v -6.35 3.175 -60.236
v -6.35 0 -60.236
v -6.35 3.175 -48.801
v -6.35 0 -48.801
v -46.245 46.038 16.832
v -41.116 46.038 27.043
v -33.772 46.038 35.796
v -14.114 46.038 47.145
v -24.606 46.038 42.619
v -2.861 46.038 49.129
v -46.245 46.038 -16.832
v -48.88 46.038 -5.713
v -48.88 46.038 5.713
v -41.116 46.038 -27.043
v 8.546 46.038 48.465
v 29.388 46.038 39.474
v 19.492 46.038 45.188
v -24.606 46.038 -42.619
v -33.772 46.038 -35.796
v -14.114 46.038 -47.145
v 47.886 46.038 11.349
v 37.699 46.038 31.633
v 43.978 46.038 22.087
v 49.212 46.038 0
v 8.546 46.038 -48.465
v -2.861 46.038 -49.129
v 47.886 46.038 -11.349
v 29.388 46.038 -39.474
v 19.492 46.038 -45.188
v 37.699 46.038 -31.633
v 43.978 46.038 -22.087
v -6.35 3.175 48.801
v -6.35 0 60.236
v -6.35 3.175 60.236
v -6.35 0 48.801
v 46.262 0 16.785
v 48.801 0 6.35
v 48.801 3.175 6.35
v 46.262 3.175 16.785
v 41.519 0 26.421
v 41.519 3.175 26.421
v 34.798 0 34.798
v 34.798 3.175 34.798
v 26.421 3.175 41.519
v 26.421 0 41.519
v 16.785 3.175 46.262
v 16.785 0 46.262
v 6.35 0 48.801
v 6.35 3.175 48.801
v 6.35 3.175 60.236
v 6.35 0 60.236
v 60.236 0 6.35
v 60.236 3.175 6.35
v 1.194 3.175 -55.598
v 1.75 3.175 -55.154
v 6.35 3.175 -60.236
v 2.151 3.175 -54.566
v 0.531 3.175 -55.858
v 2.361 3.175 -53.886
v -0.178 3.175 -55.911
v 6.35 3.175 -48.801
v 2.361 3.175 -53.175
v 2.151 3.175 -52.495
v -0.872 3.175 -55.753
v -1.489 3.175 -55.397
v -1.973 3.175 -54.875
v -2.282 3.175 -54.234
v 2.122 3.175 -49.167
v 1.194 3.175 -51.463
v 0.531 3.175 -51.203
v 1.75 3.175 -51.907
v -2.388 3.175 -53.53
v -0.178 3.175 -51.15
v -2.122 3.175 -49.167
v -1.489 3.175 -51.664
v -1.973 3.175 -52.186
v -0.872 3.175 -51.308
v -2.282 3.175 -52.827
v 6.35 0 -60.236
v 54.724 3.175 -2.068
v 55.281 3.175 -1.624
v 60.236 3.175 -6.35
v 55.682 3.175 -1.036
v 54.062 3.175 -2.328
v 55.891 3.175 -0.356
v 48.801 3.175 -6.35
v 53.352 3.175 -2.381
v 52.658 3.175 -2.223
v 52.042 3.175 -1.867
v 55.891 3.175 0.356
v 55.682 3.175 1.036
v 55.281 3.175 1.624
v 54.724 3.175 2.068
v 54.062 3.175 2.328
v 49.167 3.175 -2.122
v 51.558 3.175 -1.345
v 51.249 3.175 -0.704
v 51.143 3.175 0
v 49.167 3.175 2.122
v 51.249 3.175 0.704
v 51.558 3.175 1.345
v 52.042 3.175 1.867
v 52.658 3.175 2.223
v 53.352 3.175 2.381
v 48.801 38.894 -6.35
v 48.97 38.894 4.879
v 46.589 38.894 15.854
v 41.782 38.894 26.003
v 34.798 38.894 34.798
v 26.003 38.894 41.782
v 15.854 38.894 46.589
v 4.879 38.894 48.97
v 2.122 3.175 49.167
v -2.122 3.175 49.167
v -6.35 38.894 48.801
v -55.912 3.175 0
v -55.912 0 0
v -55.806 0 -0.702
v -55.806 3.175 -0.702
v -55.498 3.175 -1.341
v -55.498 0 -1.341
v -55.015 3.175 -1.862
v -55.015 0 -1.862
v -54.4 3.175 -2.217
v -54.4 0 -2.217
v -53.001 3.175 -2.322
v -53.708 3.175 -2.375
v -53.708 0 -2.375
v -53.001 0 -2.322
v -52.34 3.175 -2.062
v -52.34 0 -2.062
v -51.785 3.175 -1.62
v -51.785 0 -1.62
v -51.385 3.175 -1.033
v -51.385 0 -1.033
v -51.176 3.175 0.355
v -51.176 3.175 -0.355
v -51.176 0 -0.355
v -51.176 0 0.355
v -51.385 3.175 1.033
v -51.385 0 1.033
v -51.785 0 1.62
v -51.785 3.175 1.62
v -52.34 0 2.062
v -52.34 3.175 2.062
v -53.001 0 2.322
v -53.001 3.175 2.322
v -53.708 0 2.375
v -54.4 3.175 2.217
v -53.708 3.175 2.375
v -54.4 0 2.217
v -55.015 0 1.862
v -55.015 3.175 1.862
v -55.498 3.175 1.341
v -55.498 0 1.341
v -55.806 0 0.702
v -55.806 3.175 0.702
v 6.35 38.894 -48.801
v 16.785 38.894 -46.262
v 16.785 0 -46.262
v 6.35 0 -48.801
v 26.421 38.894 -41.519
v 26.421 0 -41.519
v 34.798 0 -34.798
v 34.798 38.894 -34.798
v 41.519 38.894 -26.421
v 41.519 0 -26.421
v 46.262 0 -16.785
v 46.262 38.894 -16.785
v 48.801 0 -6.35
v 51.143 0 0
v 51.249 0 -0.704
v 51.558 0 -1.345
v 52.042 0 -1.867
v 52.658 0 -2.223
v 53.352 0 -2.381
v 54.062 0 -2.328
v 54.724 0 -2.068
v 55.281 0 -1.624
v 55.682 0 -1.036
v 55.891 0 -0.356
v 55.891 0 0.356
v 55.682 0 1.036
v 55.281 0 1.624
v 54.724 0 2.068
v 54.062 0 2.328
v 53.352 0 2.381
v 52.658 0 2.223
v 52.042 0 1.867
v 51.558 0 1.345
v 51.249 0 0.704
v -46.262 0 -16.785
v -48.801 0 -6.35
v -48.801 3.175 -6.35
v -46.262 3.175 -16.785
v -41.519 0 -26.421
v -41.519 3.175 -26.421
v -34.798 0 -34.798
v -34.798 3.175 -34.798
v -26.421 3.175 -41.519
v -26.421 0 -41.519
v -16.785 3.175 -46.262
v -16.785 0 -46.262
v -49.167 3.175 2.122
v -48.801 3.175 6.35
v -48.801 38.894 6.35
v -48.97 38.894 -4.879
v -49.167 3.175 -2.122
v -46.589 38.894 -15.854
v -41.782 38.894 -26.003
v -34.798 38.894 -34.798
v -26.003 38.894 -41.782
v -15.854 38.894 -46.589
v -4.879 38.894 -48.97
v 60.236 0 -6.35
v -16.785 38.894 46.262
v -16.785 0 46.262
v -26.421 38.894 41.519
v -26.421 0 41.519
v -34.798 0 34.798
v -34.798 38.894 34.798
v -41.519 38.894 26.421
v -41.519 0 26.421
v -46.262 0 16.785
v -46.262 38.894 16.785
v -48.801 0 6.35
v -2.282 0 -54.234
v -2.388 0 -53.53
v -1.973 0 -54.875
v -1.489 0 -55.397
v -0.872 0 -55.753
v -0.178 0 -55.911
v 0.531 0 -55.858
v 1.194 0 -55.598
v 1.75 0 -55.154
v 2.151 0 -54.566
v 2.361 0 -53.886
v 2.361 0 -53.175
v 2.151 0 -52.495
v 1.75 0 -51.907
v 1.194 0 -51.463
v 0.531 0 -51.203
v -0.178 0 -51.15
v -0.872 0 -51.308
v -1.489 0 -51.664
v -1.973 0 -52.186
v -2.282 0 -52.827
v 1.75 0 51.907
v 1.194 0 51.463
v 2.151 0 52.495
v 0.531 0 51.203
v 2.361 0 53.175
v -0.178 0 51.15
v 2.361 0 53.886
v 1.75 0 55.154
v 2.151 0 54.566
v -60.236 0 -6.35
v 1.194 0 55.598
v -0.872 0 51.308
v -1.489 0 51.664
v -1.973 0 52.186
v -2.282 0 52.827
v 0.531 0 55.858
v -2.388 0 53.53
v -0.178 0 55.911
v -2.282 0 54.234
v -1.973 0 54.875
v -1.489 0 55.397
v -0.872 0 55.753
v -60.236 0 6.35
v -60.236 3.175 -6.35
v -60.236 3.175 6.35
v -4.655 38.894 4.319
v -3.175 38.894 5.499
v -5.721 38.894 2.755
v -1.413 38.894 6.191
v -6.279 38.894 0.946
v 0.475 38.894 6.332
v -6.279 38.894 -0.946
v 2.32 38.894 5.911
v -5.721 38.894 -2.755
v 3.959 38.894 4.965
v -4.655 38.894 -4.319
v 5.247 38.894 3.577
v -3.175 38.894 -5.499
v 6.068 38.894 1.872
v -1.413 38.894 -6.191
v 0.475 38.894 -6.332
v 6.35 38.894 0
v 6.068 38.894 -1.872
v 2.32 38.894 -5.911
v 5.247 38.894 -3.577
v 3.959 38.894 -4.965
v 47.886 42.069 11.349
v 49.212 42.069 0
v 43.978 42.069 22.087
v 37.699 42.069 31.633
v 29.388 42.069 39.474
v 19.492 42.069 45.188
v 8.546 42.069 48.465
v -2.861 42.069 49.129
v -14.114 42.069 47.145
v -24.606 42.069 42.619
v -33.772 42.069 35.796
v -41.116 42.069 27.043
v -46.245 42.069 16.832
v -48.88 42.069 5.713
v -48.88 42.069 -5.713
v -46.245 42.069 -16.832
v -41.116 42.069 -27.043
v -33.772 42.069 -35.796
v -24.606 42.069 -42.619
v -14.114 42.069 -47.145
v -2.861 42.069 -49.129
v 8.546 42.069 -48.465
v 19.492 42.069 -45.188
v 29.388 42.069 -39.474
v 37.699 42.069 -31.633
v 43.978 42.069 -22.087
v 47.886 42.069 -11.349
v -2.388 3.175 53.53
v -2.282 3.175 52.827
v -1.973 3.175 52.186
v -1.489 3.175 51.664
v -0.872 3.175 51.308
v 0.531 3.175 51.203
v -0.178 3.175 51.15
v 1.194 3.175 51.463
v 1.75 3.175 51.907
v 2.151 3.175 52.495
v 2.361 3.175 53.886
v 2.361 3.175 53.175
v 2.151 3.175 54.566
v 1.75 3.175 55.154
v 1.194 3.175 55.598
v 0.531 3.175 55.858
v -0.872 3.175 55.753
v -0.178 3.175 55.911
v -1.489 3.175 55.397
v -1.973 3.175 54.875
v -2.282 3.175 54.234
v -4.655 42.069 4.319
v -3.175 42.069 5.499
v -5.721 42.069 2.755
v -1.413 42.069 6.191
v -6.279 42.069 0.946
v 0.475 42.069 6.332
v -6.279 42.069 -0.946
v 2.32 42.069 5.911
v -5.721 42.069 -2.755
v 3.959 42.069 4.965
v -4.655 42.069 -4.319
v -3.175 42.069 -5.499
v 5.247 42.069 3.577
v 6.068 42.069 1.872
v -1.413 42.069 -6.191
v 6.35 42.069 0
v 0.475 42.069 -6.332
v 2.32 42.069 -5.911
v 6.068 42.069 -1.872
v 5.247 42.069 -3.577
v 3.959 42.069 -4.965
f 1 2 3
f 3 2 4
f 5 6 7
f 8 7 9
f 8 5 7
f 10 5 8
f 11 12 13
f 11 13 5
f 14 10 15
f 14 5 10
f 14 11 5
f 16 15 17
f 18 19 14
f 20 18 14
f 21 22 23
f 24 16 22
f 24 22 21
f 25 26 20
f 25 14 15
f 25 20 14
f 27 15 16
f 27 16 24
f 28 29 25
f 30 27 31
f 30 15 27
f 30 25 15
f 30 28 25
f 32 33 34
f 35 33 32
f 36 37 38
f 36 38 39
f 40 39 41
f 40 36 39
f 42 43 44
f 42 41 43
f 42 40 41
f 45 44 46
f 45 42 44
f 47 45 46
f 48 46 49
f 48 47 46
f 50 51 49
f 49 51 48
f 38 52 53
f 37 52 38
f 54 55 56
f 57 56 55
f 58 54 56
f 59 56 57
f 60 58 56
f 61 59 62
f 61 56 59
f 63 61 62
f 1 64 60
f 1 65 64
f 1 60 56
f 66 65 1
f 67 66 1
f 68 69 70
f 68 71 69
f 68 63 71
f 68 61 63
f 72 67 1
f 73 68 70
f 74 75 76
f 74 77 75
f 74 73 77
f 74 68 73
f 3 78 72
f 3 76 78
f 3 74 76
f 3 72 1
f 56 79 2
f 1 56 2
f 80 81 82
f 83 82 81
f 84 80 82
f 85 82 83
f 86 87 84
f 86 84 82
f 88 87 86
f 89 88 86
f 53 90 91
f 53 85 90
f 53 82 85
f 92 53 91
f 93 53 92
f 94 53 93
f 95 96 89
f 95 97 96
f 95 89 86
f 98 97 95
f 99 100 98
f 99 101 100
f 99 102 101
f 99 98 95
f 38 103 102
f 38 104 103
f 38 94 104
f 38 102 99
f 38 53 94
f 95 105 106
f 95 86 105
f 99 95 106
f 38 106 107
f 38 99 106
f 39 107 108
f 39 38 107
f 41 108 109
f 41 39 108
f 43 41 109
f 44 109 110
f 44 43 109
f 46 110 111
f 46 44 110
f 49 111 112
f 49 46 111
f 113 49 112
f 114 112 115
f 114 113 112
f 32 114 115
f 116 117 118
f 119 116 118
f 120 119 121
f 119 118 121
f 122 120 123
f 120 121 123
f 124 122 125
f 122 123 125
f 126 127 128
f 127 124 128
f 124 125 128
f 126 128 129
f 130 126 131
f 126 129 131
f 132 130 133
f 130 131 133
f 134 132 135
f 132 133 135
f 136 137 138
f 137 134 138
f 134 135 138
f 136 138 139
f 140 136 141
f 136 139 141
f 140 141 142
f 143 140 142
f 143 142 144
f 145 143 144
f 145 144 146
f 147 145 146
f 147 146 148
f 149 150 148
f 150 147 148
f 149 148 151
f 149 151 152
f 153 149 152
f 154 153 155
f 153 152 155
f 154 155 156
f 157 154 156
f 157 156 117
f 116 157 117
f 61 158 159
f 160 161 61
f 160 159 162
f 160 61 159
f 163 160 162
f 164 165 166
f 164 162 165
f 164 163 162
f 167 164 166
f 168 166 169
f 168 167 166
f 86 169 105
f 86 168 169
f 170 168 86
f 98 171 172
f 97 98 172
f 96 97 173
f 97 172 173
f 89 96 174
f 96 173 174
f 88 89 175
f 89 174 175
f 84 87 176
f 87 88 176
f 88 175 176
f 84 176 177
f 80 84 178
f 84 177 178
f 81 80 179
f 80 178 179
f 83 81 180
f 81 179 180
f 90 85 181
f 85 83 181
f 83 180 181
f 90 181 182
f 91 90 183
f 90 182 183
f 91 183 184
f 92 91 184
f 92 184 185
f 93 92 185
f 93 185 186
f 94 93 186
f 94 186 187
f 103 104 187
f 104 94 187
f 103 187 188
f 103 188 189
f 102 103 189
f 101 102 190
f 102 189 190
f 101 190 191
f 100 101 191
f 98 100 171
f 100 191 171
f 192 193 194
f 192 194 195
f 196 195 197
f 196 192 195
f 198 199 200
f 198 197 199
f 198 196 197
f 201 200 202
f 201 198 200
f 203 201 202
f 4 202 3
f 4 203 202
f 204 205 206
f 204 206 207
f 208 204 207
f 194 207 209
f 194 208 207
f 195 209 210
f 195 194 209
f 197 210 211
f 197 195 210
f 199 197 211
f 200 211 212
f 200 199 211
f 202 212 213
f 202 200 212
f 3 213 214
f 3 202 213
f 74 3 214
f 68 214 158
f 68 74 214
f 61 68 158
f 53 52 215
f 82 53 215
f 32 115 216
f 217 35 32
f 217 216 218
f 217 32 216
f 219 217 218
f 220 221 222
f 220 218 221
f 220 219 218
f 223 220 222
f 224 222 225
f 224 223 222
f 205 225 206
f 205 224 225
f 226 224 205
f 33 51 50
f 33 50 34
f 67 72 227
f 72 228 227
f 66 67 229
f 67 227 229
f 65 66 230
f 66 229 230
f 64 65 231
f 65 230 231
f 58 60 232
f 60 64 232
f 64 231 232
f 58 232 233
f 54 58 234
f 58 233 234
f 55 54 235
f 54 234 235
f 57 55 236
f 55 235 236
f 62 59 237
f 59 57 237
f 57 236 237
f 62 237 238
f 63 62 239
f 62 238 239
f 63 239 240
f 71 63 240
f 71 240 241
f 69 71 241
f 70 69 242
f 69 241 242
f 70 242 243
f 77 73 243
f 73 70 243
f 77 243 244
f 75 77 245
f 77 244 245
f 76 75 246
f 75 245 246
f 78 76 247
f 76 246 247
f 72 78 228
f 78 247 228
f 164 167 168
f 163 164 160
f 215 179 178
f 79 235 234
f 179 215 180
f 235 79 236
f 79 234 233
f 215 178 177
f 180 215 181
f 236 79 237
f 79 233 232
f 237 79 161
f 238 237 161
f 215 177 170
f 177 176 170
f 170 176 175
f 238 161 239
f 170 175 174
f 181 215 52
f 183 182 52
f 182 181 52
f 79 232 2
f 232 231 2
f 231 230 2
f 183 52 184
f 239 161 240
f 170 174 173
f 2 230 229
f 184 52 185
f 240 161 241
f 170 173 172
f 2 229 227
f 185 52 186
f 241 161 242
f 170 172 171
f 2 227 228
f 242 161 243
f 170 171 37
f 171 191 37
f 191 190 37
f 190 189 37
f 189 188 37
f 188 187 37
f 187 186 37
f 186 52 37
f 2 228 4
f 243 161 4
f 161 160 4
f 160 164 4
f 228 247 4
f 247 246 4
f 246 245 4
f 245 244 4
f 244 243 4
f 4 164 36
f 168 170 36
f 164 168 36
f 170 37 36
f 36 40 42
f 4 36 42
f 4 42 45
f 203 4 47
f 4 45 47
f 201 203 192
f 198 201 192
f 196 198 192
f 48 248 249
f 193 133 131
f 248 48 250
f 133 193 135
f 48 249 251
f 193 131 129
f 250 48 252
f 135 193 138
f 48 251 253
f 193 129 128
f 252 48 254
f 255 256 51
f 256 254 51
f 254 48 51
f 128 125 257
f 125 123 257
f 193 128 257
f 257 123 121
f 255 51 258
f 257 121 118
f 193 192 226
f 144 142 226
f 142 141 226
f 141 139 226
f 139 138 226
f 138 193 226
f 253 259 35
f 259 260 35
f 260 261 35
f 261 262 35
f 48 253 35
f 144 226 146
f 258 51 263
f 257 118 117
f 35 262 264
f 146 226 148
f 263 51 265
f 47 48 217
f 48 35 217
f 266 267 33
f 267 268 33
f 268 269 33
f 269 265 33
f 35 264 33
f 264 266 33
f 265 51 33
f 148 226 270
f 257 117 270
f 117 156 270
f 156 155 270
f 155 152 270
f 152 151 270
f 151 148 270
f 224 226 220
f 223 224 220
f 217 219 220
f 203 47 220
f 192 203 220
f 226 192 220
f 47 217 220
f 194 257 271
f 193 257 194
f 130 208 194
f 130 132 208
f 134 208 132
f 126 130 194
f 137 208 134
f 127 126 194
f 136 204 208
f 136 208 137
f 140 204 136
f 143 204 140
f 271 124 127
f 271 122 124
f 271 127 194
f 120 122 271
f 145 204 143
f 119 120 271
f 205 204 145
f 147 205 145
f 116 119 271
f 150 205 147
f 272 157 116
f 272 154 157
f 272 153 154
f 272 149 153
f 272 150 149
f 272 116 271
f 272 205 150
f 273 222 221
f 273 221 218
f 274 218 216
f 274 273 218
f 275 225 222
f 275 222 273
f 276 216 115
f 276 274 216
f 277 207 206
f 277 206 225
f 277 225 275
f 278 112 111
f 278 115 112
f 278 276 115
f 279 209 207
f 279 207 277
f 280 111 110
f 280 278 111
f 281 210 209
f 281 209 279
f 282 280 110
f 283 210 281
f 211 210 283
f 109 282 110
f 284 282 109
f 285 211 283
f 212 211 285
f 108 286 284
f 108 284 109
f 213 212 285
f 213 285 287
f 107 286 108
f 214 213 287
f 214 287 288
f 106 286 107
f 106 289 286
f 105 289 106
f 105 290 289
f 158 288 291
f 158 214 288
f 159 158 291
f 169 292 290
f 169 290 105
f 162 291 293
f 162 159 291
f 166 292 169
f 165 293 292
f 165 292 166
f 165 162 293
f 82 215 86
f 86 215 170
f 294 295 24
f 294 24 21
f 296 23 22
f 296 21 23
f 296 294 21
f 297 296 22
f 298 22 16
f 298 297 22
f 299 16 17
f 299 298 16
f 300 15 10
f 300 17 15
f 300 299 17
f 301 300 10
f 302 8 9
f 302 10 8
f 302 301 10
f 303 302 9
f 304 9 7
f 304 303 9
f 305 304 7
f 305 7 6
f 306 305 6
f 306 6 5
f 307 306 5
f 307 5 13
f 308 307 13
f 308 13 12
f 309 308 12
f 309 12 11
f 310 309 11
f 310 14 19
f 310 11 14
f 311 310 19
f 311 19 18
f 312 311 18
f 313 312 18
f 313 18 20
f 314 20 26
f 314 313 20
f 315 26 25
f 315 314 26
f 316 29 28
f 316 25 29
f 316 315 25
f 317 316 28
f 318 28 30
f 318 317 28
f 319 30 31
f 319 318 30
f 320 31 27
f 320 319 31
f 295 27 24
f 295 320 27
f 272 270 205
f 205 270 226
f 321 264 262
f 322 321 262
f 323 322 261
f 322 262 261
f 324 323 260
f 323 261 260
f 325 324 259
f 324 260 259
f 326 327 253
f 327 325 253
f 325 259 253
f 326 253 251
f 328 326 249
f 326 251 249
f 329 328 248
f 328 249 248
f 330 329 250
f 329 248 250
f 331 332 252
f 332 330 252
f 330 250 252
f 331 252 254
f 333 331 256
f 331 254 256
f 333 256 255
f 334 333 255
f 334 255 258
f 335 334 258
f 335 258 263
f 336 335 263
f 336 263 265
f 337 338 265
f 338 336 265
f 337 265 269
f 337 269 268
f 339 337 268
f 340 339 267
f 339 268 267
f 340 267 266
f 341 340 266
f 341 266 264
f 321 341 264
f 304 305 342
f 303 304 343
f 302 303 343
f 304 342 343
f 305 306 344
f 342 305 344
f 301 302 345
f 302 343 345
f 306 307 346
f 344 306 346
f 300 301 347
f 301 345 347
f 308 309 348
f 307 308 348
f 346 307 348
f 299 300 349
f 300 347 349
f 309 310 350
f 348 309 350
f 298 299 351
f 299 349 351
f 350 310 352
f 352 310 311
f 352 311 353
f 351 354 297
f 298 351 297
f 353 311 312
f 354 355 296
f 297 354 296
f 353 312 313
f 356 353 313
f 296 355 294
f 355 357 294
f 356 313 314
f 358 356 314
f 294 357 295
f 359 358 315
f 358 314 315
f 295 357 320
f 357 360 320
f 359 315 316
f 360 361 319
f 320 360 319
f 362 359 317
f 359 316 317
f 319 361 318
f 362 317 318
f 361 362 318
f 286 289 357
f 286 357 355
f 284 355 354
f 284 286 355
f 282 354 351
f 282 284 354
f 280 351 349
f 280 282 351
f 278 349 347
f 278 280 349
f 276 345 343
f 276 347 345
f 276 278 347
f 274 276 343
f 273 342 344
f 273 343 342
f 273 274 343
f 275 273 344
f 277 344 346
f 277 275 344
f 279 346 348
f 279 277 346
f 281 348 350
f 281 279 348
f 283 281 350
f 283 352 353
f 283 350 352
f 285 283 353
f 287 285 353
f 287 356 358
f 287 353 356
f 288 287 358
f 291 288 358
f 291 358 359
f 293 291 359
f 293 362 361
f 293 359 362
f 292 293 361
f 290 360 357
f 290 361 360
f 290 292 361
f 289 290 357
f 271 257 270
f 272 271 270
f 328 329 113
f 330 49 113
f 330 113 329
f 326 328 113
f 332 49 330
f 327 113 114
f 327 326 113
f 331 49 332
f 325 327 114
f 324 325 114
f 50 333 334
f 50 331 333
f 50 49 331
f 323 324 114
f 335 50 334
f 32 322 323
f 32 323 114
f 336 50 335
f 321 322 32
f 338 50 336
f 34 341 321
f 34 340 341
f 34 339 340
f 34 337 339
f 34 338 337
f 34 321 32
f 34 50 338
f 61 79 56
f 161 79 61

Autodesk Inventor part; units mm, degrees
ref_plane "YZ Plane" through (0, 0, 0) normal (1, 0, 0) x (0, 1, 0)
ref_plane "XZ Plane" through (0, 0, 0) normal (0, 1, 0) x (-1, 0, 0)
ref_plane "XY Plane" through (0, 0, 0) normal (0, 0, 1) x (1, 0, 0)
sketch "Sketch1" plane through (0, 0, 0) normal (0, 1, 0) x (-1, 0, 0)
  circle A0 centre (53.5305, 0) radius 2.3813
  circle A1 centre (0, -53.5305) radius 2.3876
  circle A2 centre (-53.5305, 0) radius 2.3876
  circle A3 centre (0, 53.5305) radius 2.3876
  line L0 (0, 60.2361) -> (-6.35, 60.2361)
  line L1 (-6.35, 60.2361) -> (6.35, 60.2361)
  line L2 (6.35, 60.2361) -> (6.35, 48.8011)
  line L3 (-6.35, 60.2361) -> (-6.35, 48.8011)
  line L4 (-60.2361, 0) -> (-60.2361, -6.35)
  line L5 (-60.2361, -6.35) -> (-60.2361, 6.35)
  line L6 (-60.2361, 6.35) -> (-48.8011, 6.35)
  line L7 (-60.2361, -6.35) -> (-48.8011, -6.35)
  line L8 (0, -60.2361) -> (-6.35, -60.2361)
  line L9 (-6.35, -60.2361) -> (6.35, -60.2361)
  line L10 (6.35, -60.2361) -> (6.35, -48.8011)
  line L11 (-6.35, -60.2361) -> (-6.35, -48.8011)
  line L12 (60.2361, 0) -> (60.2361, -6.35)
  line L13 (60.2361, -6.35) -> (60.2361, 6.35)
  line L14 (60.2361, 6.35) -> (48.8011, 6.35)
  line L15 (60.2361, -6.35) -> (48.8011, -6.35)
  arc A4 (6.35, -48.8011) -> (48.8011, -6.35) centre (0, 0) ccw
  arc A5 (-48.8011, -6.35) -> (-6.35, -48.8011) centre (0, 0) ccw
  arc A6 (48.8011, 6.35) -> (6.35, 48.8011) centre (0, 0) ccw
  arc A7 (-6.35, 48.8011) -> (-48.8011, 6.35) centre (0, 0) ccw
  circle A8 centre (0, 0) radius 49.2125
  dimension "d6" = 4.7625
  dimension "d7" = 4.7752
  dimension "d8" = 4.7752
  dimension "d9" = 4.7752
  dimension "d11" = 6.7056
  dimension "d12" = 6.7056
  dimension "d13" = 6.7056
  dimension "d14" = 6.7056
  dimension "d15" = 6.35
  dimension "d16" = 12.7
  dimension "d17" = 6.35
  dimension "d18" = 12.7
  dimension "d19" = 6.35
  dimension "d20" = 12.7
  dimension "d21" = 6.35
  dimension "d22" = 12.7
extrude "Extrusion1" add sketch "Sketch1" along normal blind 3.175
sketch "Sketch2" plane through (0, 3.175, 0) normal (0, 1, 0) x (1, 0, 0)
  arc A0 (48.8011, 6.35) -> (6.35, 48.8011) centre (0, 0) ccw projected
  arc A1 (-48.8011, -6.35) -> (-6.35, -48.8011) centre (0, 0) ccw projected
  circle A2 centre (0, 0) radius 49.2125
extrude "Extrusion2" add sketch "Sketch2" along normal blind 35.7188
sketch "Sketch3" plane through (0, 38.8937, 0) normal (0, 1, 0) x (1, 0, 0)
  circle A0 centre (0, 0) radius 49.2125 projected
  circle A1 centre (0, 0) radius 6.35
  dimension "d27" = 12.7
extrude "Extrusion3" add sketch "Sketch3" along normal blind 3.175 contours A1
sketch "Sketch4" plane through (0, 42.0688, 0) normal (0, 1, 0) x (1, 0, 0)
  circle A0 centre (0, 0) radius 6.35 projected
  circle A1 centre (0, 0) radius 49.2125
  dimension "d30" = 98.425
extrude "Extrusion4" add sketch "Sketch4" along normal blind 3.9688 contours A0 | A1
properties part number "Rotating Base"
